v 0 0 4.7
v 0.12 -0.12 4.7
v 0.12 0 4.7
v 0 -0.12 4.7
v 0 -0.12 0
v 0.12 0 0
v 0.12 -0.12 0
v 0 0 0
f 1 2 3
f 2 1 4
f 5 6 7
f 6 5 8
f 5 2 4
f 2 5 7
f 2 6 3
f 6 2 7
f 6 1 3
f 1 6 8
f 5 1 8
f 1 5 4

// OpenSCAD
// file: lib/lodge_kit.scad
// Lodge shell tile kit — shared dimensions and modules.
//
// The game paints a lodge footprint in 5 m cells and resolves the
// exterior from these tiles at half-cell (2.5 m) resolution; see
// internal/world/lodge_shell.go. Every tile is authored in the same
// canonical frame:
//
//   * origin on the lodge floor plane (Z = 0);
//   * wall-type tiles sit on a footprint edge, centred on it, with the
//     OUTSIDE toward SCAD −Y (game +Z) and the wall thickness toward +Y;
//   * roof tiles are centred on a half-cell, with Z = 0 at the tile's
//     lowest corner; slopes fall toward −Y (game +Z);
//   * corner tiles sit on a grid vertex; an outer corner's building is
//     in the SCAD (−X, +Y) quadrant, an inner corner's notch in (+X, −Y).
//
// Colours are near-neutral: the renderer tints walls and roofs per lodge
// from a seeded palette (world.ShellPalette).
//
// Keep these in sync with the constants in lodge_shell.go.

tile   = 2.5;   // ShellTileSize
wall_h = 5.0;   // ShellWallHeight
rise   = 2.1;   // ShellRoofRise, per tile of run
pitch  = rise / tile;

wall_t   = 0.35;  // wall thickness
sink     = 1.5;   // walls run this far below the floor to hide pad grading
roof_t   = 0.25;  // roof slab thickness
overhang = 0.7;   // eaves overhang past the wall plane

c_wall   = [0.92, 0.90, 0.86];
c_stone  = [0.62, 0.61, 0.60];
c_trim   = [0.97, 0.97, 0.95];
c_glass  = [0.30, 0.42, 0.52];
c_door   = [0.36, 0.25, 0.18];
c_roof   = [0.97, 0.97, 0.97];
c_fascia = [0.55, 0.52, 0.50];

// Plain wall panel: timber above a stone plinth, a trim band under the
// eaves.
module wall_panel() {
    color(c_wall)
        translate([-tile/2, 0, -sink]) cube([tile, wall_t, wall_h + sink]);
    color(c_stone)
        translate([-tile/2, -0.06, -sink]) cube([tile, wall_t, sink + 0.7]);
    color(c_trim)
        translate([-tile/2, -0.04, wall_h - 0.3]) cube([tile, 0.1, 0.3]);
    battens();
}

// Horizontal board lines above the plinth.
module battens() {
    color(c_wall * 0.8)
        for (z = [1.3 : 0.6 : wall_h - 0.6])
            translate([-tile/2, -0.03, z]) cube([tile, 0.04, 0.06]);
}

// A framed pane on the outer face. x0/w along the wall, z0/h up it.
module pane(x0, w, z0, h) {
    color(c_trim)
        translate([x0 - 0.1, -0.05, z0 - 0.1]) cube([w + 0.2, 0.06, h + 0.2]);
    color(c_glass)
        translate([x0, -0.08, z0]) cube([w, 0.06, h]);
}

module wall_window() {
    wall_panel();
    pane(-0.7, 1.4, 1.4, 2.2);
    color(c_trim) translate([-0.02, -0.1, 1.4]) cube([0.04, 0.04, 2.2]); // mullion
}

// Tall window flanked by shutters.
module wall_window_alt() {
    wall_panel();
    pane(-0.5, 1.0, 1.2, 2.8);
    color(c_door) {
        translate([-1.0, -0.1, 1.2]) cube([0.4, 0.05, 2.8]);
        translate([ 0.6, -0.1, 1.2]) cube([0.4, 0.05, 2.8]);
    }
}

// Floor-to-eave glazing for food courts: a low stone sill, then glass in
// three lights.
module wall_glazed() {
    color(c_wall)
        translate([-tile/2, 0, -sink]) cube([tile, wall_t, wall_h + sink]);
    color(c_stone)
        translate([-tile/2, -0.06, -sink]) cube([tile, wall_t, sink + 0.35]);
    color(c_glass)
        translate([-tile/2, -0.09, 0.35]) cube([tile, 0.06, wall_h - 0.75]);
    color(c_trim) {
        for (x = [-tile/2, -tile/6, tile/6, tile/2 - 0.08])
            translate([x, -0.12, 0.35]) cube([0.08, 0.06, wall_h - 0.75]);
        translate([-tile/2, -0.12, wall_h - 0.45]) cube([tile, 0.07, 0.1]);
    }
}

// Glazed entry door under a small canopy, with a step.
module door() {
    color(c_wall)
        translate([-tile/2, 0, -sink]) cube([tile, wall_t, wall_h + sink]);
    color(c_stone)
        translate([-tile/2, -0.06, -sink]) cube([tile, wall_t, sink + 0.15]);
    battens();
    color(c_door)
        translate([-0.9, -0.1, 0]) cube([1.8, 0.1, 2.7]);
    color(c_glass) {
        translate([-0.75, -0.13, 0.9]) cube([0.65, 0.05, 1.6]);
        translate([ 0.10, -0.13, 0.9]) cube([0.65, 0.05, 1.6]);
    }
    color(c_trim)
        translate([-tile/2, -0.04, wall_h - 0.3]) cube([tile, 0.1, 0.3]);
    color(c_roof)   // canopy
        translate([-1.2, -1.3, 3.0])
            rotate([-12, 0, 0]) cube([2.4, 1.3, 0.12]);
    color(c_stone)  // step
        translate([-1.1, -0.9, -0.3]) cube([2.2, 0.9, 0.42]);
}

module corner_outer() {
    color(c_stone)
        translate([-0.3, -0.05, -sink]) cube([0.35, 0.35, wall_h + sink - 0.3]);
}

module corner_inner() {
    color(c_trim)
        translate([0, -0.12, 0]) cube([0.12, 0.12, wall_h - 0.3]);
}

// Roof slab over one half-cell. h lists corner heights (in rise units)
// in SCAD order (−X,+Y), (+X,+Y), (+X,−Y), (−X,−Y); split names which
// diagonal the top surface folds along: 0 through corners 0–2, 1
// through corners 1–3.
module roof_tile(h, split) {
    p = [[-tile/2, tile/2], [tile/2, tile/2], [tile/2, -tile/2], [-tile/2, -tile/2]];
    top = [for (i = [0:3]) [p[i][0], p[i][1], h[i] * rise]];
    bot = [for (i = [0:3]) [p[i][0], p[i][1], h[i] * rise - roof_t]];
    tris = split == 0 ? [[0, 1, 2], [0, 2, 3]] : [[0, 1, 3], [1, 2, 3]];
    color(c_roof)
        polyhedron(
            points = concat(top, bot),
            faces = concat(
                // top (clockwise seen from above = outward in OpenSCAD)
                [for (t = tris) [t[0], t[1], t[2]]],
                [for (t = tris) [t[2] + 4, t[1] + 4, t[0] + 4]],
                [for (i = [0:3]) [i, i + 4, (i + 1) % 4 + 4, (i + 1) % 4]]
            ));
}

// Eaves strip past a wall edge: continues the roof plane outward and
// down, finished with a fascia board.
module eave() {
    drop = overhang * pitch;
    color(c_roof)
        polyhedron(
            points = [
                [-tile/2, 0, 0], [tile/2, 0, 0], [tile/2, -overhang, -drop], [-tile/2, -overhang, -drop],
                [-tile/2, 0, -roof_t], [tile/2, 0, -roof_t], [tile/2, -overhang, -drop - roof_t], [-tile/2, -overhang, -drop - roof_t],
            ],
            faces = [[0, 1, 2, 3], [7, 6, 5, 4], [0, 4, 5, 1], [1, 5, 6, 2], [2, 6, 7, 3], [3, 7, 4, 0]]);
    color(c_fascia)
        translate([-tile/2, -overhang - 0.05, -drop - roof_t - 0.1]) cube([tile, 0.08, roof_t + 0.2]);
}

// Eaves in the square past an outer corner: a hip folding along the
// diagonal away from the building.
module eave_corner() {
    o = overhang;
    d = o * pitch;
    color(c_roof)
        polyhedron(
            points = [
                [0, 0, 0], [o, 0, -d], [o, -o, -d], [0, -o, -d],
                [0, 0, -roof_t], [o, 0, -d - roof_t], [o, -o, -d - roof_t], [0, -o, -d - roof_t],
            ],
            faces = [[0, 1, 2], [0, 2, 3], [6, 5, 4], [7, 6, 4], [0, 4, 5, 1], [1, 5, 6, 2], [2, 6, 7, 3], [3, 7, 4, 0]]);
    color(c_fascia) {
        translate([0, -o - 0.05, -d - roof_t - 0.1]) cube([o + 0.05, 0.08, roof_t + 0.2]);
        translate([o - 0.03, -o - 0.05, -d - roof_t - 0.1]) cube([0.08, o + 0.05, roof_t + 0.2]);
    }
}

module chimney() {
    color(c_stone)
        translate([-0.55, -0.55, -1.0]) cube([1.1, 1.1, rise + 3.0]);
    color(c_fascia)
        translate([-0.65, -0.65, rise + 1.8]) cube([1.3, 1.3, 0.2]);
}
// main file
// Lodge shell kit: inner corner trim. See lib/lodge_kit.scad.
include <lib/lodge_kit.scad>
corner_inner();
